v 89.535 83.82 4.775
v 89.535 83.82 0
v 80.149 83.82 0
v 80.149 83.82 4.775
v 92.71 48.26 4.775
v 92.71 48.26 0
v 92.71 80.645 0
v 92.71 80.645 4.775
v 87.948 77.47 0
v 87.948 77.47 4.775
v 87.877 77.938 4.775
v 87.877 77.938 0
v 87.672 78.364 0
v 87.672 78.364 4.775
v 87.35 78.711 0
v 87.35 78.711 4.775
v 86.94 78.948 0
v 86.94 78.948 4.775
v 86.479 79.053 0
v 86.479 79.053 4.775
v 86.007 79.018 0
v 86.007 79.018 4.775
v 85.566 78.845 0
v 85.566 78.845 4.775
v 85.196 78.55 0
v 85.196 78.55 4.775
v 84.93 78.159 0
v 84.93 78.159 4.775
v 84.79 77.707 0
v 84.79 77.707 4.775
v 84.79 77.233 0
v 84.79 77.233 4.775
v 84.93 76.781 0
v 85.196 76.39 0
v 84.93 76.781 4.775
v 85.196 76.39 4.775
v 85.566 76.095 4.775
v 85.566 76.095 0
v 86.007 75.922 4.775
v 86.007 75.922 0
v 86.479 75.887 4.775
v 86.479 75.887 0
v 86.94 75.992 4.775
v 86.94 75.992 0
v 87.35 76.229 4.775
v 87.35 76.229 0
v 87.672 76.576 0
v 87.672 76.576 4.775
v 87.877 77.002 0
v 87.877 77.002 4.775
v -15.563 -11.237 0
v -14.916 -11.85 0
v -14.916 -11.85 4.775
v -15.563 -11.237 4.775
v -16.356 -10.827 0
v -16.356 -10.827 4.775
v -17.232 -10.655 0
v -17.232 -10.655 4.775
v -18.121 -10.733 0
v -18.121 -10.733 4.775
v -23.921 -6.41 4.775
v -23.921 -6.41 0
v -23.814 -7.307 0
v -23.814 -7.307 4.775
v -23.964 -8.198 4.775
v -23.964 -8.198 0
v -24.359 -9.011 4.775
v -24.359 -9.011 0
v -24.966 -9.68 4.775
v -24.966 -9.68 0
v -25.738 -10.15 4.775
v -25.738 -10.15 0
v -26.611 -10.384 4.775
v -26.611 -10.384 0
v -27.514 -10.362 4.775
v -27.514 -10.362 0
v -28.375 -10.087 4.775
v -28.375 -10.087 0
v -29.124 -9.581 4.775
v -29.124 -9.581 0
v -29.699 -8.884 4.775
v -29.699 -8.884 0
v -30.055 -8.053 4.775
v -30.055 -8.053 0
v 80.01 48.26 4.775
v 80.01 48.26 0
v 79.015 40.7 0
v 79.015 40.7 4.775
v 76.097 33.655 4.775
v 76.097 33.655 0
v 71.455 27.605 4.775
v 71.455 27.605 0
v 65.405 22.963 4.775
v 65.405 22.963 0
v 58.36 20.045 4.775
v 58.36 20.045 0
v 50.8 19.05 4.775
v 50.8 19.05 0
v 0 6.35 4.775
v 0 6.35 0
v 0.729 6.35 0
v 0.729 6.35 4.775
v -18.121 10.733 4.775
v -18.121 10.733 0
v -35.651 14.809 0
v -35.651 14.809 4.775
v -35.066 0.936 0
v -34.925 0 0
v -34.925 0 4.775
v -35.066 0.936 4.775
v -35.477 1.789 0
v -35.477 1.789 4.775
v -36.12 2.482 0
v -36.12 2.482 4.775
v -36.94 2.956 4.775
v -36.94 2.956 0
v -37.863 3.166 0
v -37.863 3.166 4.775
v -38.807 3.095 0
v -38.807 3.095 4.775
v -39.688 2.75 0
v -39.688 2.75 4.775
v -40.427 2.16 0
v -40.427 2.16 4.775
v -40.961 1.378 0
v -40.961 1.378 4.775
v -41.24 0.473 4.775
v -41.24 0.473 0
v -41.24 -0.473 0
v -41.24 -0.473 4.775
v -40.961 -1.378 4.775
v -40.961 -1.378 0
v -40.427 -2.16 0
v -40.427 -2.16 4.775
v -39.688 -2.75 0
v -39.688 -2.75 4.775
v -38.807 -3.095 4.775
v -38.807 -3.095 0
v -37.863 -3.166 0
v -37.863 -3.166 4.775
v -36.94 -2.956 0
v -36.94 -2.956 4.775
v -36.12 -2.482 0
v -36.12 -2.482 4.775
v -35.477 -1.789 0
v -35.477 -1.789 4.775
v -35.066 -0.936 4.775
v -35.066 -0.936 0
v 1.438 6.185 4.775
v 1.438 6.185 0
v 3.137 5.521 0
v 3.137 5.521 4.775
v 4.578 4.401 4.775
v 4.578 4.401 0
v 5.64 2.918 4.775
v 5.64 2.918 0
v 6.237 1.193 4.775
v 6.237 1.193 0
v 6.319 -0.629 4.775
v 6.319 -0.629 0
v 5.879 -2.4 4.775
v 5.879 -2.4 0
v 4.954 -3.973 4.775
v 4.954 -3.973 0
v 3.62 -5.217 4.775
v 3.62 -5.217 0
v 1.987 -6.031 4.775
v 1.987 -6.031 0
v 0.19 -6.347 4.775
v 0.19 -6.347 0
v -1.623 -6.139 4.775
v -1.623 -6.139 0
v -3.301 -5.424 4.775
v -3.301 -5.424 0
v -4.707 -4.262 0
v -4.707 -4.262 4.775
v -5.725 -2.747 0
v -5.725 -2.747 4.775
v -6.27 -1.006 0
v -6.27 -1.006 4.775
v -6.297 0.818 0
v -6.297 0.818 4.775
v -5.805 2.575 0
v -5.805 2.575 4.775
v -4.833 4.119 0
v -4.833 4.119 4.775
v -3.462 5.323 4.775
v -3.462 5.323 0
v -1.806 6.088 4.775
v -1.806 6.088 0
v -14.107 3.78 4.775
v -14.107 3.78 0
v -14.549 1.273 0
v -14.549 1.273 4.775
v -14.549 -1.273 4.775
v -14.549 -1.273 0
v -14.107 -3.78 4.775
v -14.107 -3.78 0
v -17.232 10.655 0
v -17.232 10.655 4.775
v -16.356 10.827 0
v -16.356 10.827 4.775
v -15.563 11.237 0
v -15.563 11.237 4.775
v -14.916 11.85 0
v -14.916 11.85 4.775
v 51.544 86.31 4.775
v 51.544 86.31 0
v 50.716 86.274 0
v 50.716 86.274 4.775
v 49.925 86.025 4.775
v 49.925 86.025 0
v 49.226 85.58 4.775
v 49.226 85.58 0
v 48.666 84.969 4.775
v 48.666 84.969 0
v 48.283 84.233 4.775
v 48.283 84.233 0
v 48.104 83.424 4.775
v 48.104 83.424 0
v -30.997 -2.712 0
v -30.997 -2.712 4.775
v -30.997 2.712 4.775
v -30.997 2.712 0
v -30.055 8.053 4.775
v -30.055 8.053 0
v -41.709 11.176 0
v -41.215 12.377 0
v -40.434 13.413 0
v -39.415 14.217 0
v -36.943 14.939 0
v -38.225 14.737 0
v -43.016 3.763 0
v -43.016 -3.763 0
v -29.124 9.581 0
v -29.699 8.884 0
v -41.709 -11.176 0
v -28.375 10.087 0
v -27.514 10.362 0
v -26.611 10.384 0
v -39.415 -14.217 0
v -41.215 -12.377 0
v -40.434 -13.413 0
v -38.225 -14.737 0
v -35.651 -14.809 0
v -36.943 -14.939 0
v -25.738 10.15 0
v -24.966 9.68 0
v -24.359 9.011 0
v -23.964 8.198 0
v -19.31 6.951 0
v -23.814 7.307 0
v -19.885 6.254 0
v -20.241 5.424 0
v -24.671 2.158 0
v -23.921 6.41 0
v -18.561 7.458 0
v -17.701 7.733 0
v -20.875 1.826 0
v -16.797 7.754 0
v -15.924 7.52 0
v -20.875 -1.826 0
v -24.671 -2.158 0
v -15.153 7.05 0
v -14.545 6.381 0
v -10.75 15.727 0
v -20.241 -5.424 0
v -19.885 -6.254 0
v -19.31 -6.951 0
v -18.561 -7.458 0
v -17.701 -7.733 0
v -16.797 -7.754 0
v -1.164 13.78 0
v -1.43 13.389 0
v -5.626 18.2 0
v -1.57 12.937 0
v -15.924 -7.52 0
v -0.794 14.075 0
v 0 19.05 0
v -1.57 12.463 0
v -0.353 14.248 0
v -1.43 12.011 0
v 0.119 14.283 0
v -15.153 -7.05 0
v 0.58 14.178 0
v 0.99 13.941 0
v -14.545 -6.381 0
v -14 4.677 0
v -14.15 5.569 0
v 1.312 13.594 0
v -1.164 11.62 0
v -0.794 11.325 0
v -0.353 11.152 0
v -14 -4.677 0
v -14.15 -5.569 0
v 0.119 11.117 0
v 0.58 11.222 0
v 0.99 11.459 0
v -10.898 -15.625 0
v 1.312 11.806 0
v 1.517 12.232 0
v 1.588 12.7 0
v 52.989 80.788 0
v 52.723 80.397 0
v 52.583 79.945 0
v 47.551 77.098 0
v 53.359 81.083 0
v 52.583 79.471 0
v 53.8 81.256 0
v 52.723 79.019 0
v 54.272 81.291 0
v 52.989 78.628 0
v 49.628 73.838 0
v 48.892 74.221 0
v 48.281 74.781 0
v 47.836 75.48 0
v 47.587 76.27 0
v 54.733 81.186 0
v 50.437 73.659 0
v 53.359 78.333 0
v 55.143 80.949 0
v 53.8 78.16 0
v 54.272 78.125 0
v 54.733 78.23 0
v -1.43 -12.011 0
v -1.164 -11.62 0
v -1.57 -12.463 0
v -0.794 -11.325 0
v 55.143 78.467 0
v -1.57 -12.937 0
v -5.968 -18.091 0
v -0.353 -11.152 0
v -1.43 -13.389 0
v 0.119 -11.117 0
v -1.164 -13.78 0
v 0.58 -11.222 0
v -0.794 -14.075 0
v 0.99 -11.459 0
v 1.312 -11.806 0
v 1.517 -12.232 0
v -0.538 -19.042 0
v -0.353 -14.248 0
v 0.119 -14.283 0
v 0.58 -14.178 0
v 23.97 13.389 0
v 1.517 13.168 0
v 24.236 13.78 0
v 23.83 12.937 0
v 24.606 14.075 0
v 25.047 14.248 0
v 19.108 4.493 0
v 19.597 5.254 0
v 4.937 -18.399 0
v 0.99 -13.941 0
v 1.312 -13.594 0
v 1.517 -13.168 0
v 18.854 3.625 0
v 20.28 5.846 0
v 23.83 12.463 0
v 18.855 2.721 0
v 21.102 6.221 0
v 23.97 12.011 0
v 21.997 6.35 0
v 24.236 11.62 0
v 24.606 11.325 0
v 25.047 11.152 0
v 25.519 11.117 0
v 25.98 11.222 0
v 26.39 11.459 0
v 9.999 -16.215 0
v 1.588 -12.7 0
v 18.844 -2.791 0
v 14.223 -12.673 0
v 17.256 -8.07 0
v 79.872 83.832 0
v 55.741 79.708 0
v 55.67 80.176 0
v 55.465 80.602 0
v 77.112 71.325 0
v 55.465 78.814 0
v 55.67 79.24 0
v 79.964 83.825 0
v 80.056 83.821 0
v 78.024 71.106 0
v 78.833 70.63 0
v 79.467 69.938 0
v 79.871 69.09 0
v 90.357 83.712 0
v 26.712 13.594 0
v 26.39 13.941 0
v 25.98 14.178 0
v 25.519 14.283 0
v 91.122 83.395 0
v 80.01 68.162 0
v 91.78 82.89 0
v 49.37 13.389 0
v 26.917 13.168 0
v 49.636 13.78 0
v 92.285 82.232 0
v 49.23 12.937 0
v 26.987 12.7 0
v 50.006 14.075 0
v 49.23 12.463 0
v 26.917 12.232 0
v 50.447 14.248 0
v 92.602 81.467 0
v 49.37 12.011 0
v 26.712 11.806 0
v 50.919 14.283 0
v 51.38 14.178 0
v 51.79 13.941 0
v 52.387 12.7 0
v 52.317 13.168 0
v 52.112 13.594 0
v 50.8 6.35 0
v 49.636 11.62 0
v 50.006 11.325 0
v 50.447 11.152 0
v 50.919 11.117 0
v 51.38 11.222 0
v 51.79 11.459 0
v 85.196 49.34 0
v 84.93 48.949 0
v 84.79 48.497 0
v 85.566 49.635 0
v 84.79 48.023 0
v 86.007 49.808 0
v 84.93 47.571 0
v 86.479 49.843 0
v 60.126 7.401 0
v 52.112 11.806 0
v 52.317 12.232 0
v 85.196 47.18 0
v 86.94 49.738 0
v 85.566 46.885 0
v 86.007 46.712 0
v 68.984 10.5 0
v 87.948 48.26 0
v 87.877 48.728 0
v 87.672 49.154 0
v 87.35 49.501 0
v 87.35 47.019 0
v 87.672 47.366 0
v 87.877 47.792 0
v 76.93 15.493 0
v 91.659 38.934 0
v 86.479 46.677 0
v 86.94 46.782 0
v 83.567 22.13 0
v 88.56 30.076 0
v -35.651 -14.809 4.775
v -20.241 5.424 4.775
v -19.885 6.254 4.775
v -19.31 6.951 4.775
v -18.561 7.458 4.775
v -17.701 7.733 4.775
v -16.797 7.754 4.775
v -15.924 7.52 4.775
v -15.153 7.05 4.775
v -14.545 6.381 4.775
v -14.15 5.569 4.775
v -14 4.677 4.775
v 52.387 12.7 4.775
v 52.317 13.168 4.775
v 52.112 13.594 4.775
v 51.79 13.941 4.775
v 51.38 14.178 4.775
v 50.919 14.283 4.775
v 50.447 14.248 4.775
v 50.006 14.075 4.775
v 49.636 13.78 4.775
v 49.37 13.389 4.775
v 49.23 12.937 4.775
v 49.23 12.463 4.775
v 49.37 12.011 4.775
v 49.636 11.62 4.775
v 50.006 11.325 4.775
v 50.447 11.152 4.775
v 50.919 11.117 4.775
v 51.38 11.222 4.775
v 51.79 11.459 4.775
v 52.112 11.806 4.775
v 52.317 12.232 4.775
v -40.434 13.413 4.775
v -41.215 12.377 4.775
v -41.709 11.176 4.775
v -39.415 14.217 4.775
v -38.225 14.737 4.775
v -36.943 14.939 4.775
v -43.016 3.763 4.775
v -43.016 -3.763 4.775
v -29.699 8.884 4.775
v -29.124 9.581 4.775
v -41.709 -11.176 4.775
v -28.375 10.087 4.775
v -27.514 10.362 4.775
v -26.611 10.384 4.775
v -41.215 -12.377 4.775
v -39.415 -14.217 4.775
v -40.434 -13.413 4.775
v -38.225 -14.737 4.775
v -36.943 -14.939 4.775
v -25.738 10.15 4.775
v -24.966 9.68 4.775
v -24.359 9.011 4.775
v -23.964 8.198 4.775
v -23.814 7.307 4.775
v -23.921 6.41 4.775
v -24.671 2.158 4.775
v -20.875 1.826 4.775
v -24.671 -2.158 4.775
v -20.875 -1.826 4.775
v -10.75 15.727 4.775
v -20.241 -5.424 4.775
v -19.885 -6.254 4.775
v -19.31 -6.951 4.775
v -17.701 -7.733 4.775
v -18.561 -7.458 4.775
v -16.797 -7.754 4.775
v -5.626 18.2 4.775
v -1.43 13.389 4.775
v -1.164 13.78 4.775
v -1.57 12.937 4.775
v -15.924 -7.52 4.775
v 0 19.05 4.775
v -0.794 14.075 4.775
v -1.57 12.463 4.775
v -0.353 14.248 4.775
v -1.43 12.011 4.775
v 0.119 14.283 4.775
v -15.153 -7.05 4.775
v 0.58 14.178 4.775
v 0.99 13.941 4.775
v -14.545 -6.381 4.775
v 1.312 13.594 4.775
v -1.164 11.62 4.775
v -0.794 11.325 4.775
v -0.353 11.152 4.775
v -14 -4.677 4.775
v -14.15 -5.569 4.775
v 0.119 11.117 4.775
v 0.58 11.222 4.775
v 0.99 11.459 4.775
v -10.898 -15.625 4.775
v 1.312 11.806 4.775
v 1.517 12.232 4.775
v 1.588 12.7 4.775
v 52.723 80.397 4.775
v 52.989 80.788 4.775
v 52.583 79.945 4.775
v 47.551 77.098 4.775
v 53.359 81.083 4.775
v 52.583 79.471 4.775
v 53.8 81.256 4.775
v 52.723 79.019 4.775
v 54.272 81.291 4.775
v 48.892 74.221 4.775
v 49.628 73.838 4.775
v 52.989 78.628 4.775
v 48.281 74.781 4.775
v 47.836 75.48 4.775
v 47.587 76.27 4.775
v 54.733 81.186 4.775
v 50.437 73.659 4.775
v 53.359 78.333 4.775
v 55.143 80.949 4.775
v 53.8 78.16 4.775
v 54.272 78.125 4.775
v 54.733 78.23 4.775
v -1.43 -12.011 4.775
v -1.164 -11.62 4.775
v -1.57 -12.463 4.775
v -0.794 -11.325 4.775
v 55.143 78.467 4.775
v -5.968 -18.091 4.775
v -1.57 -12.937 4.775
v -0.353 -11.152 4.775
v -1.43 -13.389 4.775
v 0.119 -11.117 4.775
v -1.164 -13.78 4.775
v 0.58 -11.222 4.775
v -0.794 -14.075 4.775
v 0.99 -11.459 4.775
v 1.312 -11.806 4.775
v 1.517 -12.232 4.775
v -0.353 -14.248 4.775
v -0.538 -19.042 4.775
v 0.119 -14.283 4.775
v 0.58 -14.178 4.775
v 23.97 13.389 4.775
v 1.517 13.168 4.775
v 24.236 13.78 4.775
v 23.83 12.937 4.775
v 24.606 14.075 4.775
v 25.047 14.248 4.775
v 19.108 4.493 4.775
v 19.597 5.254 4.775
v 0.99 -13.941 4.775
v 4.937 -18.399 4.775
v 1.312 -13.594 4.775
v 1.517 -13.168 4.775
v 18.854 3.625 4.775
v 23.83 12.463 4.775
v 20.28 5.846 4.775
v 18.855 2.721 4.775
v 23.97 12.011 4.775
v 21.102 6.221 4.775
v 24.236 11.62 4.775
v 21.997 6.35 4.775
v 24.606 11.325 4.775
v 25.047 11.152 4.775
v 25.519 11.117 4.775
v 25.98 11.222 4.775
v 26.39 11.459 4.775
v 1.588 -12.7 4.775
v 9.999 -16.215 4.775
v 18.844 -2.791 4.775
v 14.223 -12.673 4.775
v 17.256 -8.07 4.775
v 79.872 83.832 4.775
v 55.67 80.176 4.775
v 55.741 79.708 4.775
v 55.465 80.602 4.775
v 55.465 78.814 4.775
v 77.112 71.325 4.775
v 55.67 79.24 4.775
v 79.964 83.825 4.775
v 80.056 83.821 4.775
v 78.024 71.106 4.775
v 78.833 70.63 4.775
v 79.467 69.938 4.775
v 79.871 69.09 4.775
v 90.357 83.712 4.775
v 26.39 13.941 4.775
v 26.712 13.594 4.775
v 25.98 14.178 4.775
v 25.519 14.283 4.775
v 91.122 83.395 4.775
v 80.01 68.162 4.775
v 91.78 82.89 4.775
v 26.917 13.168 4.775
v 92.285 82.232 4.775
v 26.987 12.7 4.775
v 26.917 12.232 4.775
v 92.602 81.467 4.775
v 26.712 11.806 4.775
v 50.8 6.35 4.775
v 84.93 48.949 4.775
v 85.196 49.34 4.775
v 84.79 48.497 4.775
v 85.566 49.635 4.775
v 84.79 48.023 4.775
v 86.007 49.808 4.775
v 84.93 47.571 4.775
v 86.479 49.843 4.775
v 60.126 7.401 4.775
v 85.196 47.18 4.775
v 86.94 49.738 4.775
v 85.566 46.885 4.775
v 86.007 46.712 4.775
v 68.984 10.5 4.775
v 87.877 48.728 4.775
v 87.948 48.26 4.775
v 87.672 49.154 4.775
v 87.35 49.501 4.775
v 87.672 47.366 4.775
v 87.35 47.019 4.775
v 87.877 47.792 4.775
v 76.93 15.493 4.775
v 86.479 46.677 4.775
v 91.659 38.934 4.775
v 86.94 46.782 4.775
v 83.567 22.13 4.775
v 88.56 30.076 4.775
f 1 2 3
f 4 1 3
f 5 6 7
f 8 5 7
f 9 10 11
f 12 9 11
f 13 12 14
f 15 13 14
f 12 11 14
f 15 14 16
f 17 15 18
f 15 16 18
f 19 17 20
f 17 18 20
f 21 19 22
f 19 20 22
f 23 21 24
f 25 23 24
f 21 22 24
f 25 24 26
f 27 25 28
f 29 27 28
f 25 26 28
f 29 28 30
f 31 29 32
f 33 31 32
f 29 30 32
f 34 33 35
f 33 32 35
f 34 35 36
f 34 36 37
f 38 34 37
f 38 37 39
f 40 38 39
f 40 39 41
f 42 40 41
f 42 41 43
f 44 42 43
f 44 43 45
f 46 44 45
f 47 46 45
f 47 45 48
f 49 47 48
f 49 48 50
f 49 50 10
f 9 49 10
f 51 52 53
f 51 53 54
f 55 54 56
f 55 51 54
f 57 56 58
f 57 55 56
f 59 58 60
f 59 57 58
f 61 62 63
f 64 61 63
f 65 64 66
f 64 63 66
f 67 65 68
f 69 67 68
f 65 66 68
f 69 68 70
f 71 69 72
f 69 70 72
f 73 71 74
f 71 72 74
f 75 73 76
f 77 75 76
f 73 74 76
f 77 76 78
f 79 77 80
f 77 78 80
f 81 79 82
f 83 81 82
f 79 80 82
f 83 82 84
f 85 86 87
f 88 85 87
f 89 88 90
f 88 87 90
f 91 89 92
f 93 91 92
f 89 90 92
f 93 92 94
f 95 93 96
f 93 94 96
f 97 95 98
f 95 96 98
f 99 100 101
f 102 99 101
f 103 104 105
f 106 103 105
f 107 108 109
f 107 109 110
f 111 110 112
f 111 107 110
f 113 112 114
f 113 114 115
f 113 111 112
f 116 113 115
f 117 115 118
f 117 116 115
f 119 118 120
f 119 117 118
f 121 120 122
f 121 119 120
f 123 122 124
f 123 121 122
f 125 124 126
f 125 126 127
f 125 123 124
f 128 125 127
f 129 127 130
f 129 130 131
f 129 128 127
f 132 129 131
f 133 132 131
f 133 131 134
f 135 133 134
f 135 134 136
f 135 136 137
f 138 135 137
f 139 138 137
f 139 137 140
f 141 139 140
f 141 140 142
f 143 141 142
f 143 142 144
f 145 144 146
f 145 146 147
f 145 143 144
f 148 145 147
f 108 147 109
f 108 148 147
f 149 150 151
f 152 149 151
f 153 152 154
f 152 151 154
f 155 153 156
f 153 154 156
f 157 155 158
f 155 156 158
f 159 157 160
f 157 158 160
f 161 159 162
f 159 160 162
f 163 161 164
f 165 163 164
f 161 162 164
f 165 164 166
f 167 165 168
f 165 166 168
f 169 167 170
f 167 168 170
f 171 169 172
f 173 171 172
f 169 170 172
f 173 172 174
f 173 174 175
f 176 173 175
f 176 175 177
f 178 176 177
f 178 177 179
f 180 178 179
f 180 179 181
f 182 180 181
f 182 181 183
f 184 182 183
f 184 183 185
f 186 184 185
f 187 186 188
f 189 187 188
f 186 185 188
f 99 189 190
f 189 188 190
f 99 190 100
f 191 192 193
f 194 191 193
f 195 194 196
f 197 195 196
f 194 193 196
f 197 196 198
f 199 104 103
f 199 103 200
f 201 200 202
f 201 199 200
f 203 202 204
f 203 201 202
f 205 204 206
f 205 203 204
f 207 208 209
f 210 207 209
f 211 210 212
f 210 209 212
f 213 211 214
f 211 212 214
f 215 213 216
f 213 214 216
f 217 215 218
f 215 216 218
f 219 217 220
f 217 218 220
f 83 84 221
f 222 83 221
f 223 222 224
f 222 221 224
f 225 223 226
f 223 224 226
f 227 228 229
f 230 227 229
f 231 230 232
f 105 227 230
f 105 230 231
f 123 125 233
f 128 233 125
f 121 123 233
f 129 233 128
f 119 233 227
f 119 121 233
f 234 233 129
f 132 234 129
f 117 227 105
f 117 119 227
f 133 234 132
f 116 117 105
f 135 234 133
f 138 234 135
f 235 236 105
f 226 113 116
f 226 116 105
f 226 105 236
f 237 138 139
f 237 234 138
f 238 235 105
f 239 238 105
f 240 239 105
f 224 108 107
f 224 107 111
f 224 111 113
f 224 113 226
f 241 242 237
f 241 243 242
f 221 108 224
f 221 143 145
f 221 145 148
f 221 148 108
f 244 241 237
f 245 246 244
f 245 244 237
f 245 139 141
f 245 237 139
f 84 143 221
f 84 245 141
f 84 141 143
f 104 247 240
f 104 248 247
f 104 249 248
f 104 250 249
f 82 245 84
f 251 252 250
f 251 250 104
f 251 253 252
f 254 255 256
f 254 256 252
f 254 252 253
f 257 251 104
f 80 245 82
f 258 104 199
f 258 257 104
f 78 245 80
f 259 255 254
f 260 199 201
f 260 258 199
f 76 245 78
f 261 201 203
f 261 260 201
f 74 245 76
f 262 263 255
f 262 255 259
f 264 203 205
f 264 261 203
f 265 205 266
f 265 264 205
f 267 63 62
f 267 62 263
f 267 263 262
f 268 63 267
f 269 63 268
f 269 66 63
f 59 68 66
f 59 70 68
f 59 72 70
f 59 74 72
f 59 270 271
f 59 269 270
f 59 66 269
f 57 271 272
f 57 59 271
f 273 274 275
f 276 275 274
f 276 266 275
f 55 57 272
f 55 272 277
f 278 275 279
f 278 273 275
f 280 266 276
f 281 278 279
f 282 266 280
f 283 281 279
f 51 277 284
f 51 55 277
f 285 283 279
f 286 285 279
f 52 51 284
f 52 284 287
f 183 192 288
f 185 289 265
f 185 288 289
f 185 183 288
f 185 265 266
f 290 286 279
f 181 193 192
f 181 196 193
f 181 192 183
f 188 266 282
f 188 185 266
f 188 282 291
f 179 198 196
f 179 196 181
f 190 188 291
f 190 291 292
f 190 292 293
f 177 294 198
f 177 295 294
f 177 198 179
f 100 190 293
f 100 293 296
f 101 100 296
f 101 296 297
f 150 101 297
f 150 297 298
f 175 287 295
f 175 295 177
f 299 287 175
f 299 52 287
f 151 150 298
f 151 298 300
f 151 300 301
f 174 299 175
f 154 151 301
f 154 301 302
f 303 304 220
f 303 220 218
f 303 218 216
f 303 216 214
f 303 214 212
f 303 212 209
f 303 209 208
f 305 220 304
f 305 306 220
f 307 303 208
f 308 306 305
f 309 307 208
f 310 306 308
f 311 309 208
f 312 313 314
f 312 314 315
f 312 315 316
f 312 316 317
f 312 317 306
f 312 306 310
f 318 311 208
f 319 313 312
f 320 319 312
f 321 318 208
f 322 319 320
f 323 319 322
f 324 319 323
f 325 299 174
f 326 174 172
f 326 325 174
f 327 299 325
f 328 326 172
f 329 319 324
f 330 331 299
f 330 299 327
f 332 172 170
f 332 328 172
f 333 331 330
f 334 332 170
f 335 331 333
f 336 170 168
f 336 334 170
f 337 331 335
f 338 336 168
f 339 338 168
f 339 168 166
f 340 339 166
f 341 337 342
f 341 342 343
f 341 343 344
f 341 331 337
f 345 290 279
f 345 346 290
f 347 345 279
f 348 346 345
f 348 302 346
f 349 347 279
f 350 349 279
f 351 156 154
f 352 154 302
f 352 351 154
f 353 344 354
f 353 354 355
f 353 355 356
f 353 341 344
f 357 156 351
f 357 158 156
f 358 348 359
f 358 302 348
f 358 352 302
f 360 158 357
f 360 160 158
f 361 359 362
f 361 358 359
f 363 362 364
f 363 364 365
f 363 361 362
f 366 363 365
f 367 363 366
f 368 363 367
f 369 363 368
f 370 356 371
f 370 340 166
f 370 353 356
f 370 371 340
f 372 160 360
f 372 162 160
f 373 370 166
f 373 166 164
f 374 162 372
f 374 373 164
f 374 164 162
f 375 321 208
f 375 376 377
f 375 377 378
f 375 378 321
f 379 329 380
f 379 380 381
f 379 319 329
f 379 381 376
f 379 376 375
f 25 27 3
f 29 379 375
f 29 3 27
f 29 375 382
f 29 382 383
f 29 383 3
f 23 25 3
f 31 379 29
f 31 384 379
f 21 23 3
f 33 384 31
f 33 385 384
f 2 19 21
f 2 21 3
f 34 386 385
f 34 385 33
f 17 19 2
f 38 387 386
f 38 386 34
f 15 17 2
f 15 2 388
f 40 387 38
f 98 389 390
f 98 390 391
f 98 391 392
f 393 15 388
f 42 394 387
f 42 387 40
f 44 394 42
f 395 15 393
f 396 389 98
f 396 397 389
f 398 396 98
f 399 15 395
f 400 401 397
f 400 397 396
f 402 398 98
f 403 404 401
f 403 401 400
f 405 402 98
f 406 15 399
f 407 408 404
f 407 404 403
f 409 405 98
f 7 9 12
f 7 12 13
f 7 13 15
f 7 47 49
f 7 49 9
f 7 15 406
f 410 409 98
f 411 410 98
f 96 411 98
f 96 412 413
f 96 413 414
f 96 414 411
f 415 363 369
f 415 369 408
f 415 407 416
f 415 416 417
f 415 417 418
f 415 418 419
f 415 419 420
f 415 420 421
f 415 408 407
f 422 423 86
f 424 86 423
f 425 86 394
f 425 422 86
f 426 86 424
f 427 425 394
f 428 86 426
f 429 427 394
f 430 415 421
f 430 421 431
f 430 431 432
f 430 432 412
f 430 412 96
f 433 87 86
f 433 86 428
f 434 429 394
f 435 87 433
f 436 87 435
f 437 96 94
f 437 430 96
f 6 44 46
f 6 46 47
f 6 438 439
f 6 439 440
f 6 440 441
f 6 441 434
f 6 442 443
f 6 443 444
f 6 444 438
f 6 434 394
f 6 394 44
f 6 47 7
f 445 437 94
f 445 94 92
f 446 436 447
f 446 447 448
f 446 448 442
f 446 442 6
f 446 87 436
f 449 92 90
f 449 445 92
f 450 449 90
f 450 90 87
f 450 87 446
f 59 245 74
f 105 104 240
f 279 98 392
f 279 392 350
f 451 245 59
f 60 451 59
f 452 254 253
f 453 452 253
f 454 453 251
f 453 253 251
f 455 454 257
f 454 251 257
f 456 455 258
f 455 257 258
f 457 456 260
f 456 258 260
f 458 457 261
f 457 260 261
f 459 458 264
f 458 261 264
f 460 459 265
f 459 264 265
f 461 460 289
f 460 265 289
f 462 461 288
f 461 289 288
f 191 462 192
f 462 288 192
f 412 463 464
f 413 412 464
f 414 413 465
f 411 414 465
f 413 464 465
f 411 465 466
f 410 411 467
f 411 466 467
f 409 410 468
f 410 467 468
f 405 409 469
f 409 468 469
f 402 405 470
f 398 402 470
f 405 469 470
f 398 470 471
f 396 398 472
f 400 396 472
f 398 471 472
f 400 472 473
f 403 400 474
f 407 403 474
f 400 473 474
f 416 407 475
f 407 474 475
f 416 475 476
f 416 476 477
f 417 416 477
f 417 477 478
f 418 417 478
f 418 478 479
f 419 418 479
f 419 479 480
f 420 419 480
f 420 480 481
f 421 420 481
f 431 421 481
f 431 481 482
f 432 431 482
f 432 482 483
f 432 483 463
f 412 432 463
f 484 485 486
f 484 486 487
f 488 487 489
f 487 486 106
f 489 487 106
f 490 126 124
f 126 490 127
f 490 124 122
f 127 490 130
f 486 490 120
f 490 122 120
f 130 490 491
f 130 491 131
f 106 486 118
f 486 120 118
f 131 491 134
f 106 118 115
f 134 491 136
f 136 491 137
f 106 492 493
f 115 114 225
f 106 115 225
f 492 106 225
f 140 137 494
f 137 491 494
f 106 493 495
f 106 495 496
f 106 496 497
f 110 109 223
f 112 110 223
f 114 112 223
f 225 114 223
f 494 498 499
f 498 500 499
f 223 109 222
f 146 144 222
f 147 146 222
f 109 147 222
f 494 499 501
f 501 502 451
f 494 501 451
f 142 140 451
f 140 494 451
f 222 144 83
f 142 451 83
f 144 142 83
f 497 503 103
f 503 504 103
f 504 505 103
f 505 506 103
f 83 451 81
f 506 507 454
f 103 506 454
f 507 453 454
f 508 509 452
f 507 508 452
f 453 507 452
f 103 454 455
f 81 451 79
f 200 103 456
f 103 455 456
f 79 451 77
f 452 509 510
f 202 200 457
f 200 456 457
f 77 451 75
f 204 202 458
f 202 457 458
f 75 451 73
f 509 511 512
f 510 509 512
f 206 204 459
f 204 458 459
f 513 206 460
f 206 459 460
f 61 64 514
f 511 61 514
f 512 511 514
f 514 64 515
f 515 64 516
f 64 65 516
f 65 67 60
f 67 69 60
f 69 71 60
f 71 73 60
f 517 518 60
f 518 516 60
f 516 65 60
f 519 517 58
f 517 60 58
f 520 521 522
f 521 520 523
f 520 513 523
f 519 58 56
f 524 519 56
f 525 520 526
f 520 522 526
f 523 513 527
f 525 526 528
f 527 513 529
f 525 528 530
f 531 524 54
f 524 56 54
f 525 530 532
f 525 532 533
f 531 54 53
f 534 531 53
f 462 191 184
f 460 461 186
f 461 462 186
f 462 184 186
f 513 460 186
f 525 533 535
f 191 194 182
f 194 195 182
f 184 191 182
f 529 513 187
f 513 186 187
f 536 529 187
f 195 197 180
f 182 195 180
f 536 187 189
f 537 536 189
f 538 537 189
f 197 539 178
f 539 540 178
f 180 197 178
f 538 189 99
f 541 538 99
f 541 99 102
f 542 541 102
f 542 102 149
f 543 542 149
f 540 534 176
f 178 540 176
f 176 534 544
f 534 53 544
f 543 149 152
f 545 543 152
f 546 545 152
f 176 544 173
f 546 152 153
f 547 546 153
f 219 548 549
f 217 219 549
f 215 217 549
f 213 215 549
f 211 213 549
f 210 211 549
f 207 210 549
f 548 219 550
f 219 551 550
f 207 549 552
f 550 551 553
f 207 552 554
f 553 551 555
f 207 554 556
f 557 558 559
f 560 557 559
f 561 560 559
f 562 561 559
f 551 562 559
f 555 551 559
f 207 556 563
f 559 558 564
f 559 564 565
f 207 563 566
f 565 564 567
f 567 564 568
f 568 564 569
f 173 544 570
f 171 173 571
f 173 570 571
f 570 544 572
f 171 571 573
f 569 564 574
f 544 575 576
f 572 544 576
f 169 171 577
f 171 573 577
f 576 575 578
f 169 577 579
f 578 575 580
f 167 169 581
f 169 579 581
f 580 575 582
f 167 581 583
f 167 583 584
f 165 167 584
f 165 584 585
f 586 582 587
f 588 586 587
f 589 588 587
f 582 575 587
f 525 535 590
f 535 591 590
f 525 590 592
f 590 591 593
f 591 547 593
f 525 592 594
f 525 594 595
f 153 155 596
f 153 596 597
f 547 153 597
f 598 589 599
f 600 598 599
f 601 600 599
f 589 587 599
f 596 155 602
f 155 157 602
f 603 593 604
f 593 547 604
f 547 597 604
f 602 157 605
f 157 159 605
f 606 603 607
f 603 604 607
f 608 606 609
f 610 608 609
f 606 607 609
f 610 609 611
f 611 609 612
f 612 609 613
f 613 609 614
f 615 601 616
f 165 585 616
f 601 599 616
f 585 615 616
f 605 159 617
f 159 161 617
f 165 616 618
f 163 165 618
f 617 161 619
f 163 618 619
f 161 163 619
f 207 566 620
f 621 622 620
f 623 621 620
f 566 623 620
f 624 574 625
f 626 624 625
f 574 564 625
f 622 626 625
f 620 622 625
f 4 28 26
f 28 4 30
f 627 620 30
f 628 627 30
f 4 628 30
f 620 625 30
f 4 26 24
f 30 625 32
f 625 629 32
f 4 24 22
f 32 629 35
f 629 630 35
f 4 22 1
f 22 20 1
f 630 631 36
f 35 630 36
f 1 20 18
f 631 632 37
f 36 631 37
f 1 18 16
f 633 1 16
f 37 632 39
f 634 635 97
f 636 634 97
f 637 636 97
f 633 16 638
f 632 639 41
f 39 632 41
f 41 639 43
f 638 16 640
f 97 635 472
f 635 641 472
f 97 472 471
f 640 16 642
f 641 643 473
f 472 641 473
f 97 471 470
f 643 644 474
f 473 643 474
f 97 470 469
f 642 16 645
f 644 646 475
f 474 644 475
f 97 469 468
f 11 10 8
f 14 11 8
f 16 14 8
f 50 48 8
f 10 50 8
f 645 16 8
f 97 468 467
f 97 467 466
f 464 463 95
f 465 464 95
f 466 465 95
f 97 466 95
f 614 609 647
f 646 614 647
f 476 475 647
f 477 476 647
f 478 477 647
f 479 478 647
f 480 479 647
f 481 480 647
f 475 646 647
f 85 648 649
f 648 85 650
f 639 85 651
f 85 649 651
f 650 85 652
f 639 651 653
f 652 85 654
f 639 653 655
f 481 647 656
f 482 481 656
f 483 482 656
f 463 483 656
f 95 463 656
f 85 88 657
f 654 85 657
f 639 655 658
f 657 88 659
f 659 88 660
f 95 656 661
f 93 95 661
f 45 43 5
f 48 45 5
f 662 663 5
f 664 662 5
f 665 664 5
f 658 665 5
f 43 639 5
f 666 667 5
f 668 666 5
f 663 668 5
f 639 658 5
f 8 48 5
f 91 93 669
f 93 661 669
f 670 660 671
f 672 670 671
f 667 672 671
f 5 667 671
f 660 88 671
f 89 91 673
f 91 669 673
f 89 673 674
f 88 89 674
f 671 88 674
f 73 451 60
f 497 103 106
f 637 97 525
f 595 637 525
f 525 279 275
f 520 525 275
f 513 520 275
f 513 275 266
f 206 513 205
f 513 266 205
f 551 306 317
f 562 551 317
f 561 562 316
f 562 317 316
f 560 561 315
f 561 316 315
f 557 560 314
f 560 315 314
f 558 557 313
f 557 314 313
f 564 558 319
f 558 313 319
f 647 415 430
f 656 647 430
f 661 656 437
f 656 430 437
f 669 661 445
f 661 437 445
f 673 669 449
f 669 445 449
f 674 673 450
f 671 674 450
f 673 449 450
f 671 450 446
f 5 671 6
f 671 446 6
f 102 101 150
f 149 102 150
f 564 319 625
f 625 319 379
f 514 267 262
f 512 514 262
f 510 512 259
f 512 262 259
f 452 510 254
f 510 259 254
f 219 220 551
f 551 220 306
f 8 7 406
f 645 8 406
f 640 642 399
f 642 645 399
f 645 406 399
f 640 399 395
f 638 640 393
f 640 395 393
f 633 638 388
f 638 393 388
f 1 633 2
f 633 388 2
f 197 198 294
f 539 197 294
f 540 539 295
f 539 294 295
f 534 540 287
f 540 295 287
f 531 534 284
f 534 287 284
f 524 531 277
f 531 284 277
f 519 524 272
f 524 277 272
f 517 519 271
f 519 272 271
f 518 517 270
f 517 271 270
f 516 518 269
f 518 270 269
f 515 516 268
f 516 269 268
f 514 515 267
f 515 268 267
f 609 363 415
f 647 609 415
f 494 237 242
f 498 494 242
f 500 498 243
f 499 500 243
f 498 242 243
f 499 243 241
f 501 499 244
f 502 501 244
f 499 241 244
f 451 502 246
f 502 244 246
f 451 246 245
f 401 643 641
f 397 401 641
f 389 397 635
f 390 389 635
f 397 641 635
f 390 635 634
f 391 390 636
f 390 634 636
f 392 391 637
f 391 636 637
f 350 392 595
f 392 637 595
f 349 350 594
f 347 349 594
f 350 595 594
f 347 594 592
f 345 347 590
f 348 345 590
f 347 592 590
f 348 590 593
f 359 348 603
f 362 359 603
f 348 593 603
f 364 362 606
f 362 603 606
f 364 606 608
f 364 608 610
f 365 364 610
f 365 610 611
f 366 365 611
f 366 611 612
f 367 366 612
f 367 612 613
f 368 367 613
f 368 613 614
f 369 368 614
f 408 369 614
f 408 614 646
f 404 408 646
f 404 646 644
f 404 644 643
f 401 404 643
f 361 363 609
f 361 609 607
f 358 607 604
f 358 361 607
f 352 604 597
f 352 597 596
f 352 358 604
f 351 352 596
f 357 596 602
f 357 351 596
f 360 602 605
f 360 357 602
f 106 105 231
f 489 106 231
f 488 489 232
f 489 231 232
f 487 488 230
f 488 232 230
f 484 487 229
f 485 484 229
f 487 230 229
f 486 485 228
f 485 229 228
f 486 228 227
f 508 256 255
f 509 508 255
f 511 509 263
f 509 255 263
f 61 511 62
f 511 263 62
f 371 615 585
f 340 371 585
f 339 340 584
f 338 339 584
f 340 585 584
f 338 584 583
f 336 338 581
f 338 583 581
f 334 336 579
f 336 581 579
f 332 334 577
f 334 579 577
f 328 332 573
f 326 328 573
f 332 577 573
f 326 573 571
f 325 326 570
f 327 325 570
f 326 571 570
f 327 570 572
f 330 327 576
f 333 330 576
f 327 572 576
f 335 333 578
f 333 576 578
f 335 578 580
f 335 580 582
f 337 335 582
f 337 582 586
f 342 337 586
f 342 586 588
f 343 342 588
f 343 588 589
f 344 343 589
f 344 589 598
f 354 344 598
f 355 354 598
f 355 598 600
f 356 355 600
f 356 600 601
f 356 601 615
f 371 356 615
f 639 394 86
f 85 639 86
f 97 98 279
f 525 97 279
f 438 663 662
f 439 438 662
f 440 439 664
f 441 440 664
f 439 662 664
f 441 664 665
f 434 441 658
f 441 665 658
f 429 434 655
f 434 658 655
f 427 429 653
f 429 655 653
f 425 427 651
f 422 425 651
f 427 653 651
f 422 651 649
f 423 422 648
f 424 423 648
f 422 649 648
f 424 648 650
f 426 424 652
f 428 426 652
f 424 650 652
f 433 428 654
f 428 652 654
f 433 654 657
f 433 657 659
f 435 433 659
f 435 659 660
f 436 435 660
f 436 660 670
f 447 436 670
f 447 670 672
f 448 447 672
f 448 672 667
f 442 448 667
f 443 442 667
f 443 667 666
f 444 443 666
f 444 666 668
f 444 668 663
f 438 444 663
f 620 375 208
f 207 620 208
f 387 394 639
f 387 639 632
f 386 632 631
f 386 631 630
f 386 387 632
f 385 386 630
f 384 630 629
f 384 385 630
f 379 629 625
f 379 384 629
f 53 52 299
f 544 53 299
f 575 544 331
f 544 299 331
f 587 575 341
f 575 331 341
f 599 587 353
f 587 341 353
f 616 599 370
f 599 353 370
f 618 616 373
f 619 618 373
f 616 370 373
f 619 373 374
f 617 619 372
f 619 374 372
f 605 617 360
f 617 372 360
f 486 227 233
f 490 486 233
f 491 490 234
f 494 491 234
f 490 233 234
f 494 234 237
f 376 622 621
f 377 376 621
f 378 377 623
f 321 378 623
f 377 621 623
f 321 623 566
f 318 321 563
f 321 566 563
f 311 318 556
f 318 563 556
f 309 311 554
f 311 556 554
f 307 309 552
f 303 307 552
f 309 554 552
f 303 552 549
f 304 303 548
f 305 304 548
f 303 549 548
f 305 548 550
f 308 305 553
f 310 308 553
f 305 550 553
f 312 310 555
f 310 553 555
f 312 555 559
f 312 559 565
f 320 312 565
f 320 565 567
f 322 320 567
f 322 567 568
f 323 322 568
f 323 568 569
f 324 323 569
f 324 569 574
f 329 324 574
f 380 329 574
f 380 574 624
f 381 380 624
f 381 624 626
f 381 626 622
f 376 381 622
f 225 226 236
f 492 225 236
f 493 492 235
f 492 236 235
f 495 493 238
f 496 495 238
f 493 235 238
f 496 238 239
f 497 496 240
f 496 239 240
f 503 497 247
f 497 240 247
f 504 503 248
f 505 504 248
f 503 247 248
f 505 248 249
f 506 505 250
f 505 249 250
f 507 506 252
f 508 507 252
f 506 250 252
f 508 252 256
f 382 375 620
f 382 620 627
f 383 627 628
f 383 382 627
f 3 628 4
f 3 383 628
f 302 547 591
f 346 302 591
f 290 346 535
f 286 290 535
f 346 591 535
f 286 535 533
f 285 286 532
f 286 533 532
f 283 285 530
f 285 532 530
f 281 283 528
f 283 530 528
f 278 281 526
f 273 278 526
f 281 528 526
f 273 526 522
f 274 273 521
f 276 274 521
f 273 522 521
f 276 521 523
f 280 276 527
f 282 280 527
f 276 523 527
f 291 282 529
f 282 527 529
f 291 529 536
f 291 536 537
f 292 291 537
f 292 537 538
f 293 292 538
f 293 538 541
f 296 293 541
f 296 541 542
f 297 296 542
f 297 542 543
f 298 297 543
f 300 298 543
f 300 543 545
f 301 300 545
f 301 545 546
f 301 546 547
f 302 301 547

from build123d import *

# Parameters (mm, degrees)
SKETCH1_R           = 3.175
BOSS_EXTRUDE1_DEPTH = 4.7752
FILLET1_R           = 3.175
SKETCH2_R           = 1.5875
CUT_EXTRUDE2_DEPTH  = 12.6492


with BuildPart() as part:
    # Sketch1 → Boss-Extrude1 (new body)
    with BuildSketch(Plane.XY):
        with BuildLine():
            ThreePointArc((-41.708677179, -11.175806368), (-39.414754754, -14.217464212), (-35.65126732, -14.809008693))
            Line((-35.65126732, -14.809008693), (-16.055699309, -10.252659153))
            ThreePointArc((-16.055699309, -10.252659153), (8.35578547, -17.119677251), (17.960512242, 6.35))
            Line((17.960512242, 6.35), (50.8, 6.35))
            ThreePointArc((50.8, 6.35), (80.4348452, 18.6251548), (92.71, 48.26))
            Line((92.71, 48.26), (92.71, 83.82))
            Line((92.71, 83.82), (80.01, 83.82))
            Line((80.01, 83.82), (48.380818336, 86.587194832))
            Line((48.380818336, 86.587194832), (47.273940403, 73.935522166))
            Line((47.273940403, 73.935522166), (80.01, 71.071488063))
            Line((80.01, 71.071488063), (80.01, 48.26))
            ThreePointArc((80.01, 48.26), (71.454589078, 27.605410922), (50.8, 19.05))
            Line((50.8, 19.05), (0, 19.05))
            ThreePointArc((0, 19.05), (-9.153942952, 16.706520536), (-16.055699309, 10.252659153))
            Line((-16.055699309, 10.252659153), (-35.65126732, 14.809008693))
            ThreePointArc((-35.65126732, 14.809008693), (-39.414754754, 14.217464212), (-41.708677179, 11.175806368))
            ThreePointArc((-41.708677179, 11.175806368), (-43.18, 0), (-41.708677179, -11.175806368))
        make_face()
        with BuildLine():
            ThreePointArc((-23.921153088, -6.409653652), (-26.166217118, -10.298218619), (-30.054782085, -8.053154588))
            ThreePointArc((-30.054782085, -8.053154588), (-31.115, 0), (-30.054782085, 8.053154588))
            ThreePointArc((-30.054782085, 8.053154588), (-26.166217118, 10.298218619), (-23.921153088, 6.409653652))
            ThreePointArc((-23.921153088, 6.409653652), (-24.765, 0), (-23.921153088, -6.409653652))
        make_face(mode=Mode.SUBTRACT)
        with BuildLine():
            ThreePointArc((-20.24097569, -5.42355309), (-20.955, 0), (-20.24097569, 5.42355309))
            ThreePointArc((-20.24097569, 5.42355309), (-16.352410723, 7.66861712), (-14.107346693, 3.780052154))
            ThreePointArc((-14.107346693, 3.780052154), (-14.605, 0), (-14.107346693, -3.780052154))
            ThreePointArc((-14.107346693, -3.780052154), (-16.352410723, -7.66861712), (-20.24097569, -5.42355309))
        make_face(mode=Mode.SUBTRACT)
        with Locations((-38.1, 0)):
            Circle(SKETCH1_R, mode=Mode.SUBTRACT)
        with BuildLine():
            ThreePointArc((1.438133327, 6.185003843), (-0.723783669, -6.308616108), (0, 6.35))
            Line((0, 6.35), (0.728531617, 6.35))
            Line((0.728531617, 6.35), (1.438133327, 6.185003843))
        make_face(mode=Mode.SUBTRACT)
    extrude(amount=BOSS_EXTRUDE1_DEPTH)

    # Fillet1
    # the kernel refuses this fillet: 3.175 mm, written as the material it adds along each edge
    with BuildSketch(Plane(origin=(-16.055699309, 10.252659153, 0), x_dir=(0.5808999309278821, 0.8139749813403246, 0), z_dir=(0, 0, 1))) as fillet1_piece_1:
        with BuildLine():
            CenterArc((2.126250916, 3.170784423), FILLET1_R, 202.42407708, 64.623066475)
            Line((-0.808674052, 1.959652545), (0, 0))
            ThreePointArc((0, 0), (0.981346577, 0.025293461), (1.962693154, 0))
        make_face()
    extrude(amount=4.7752)
    with BuildSketch(Plane(origin=(80.01, 71.071488063, 0), x_dir=(-0.9961946980917454, 0.08715574274765892, 0), z_dir=(0, 0, 1))) as fillet1_piece_2:
        with BuildLine():
            CenterArc((FILLET1_R * 0.916331174017, FILLET1_R), FILLET1_R, 185, 85)
            Line((-FILLET1_R * 0.0798635240743, FILLET1_R * 0.912844257252), (0, 0))
            Line((0, 0), (FILLET1_R * 0.916331174017, 0))
        make_face()
    extrude(amount=4.7752)
    with BuildSketch(Plane(origin=(80.01, 83.82, 0), x_dir=(1, 0, 0), z_dir=(0, 0, 1))) as fillet1_piece_3:
        with BuildLine():
            CenterArc((FILLET1_R * 0.0436609429085, FILLET1_R), FILLET1_R, 265, 5)
            Line((-FILLET1_R * 0.0434947998391, FILLET1_R * 0.00380530190826), (0, 0))
            Line((0, 0), (FILLET1_R * 0.0436609429085, 0))
        make_face()
    extrude(amount=4.7752)
    with BuildSketch(Plane(origin=(17.960512242, 6.35, 0), x_dir=(0.23924892683917381, -0.9709582642968253, 0), z_dir=(0, 0, 1))) as fillet1_piece_4:
        with BuildLine():
            CenterArc((4.048528681, 3.159689746), FILLET1_R, 166.157784332, 98.213210702)
            Line((0.965736192, 3.919305089), (0, 0))
            ThreePointArc((0, 0), (1.868551699, 0.091861522), (3.737103398, 0))
        make_face()
    extrude(amount=4.7752)
    with BuildSketch(Plane(origin=(-16.055699309, -10.252659153, 0), x_dir=(-0.9740163531879217, -0.22647768923781808, 0), z_dir=(0, 0, 1))) as fillet1_piece_5:
        with BuildLine():
            CenterArc((2.1199509, 3.175), FILLET1_R, 205.376933525, 64.623066475)
            ThreePointArc((-0.748686692, 1.814285714), (-0.350962429, 0.916791272), (0, 0))
            Line((0, 0), (2.1199509, 0))
        make_face()
    extrude(amount=4.7752)
    # the kernel refuses this fillet: 3.175 mm, written as the material it takes off along each edge
    with BuildSketch(Plane(origin=(47.273940403, 73.935522166, -7.9375), x_dir=(0.0871557427476583, 0.9961946980917454, 0), z_dir=(0, 0, 1)), Plane(origin=(48.380818336, 86.587194832, -7.9375), x_dir=(0.9961946980917455, -0.08715574274765811, 0), z_dir=(0, 0, 1)), Plane(origin=(92.71, 83.82, -7.9375), x_dir=(0, -1, 0), z_dir=(0, 0, 1))) as fillet1_2_piece_1:
        with BuildLine():
            CenterArc((FILLET1_R, -FILLET1_R), FILLET1_R, 90, 90)
            Line((0, -FILLET1_R), (0, 0))
            Line((0, 0), (FILLET1_R, 0))
        make_face()
    extrude(amount=20.6502, mode=Mode.SUBTRACT)

    # Sketch2 → Cut-Extrude2 (cut)
    with BuildSketch(Plane.XY.offset(4.7752)):
        with Locations((0, 12.7)):
            Circle(SKETCH2_R)
        with Locations((0, -12.7)):
            Circle(SKETCH2_R)
        with Locations((25.4, 12.7)):
            Circle(SKETCH2_R)
        with Locations((54.153215702, 79.707919533)):
            Circle(SKETCH2_R)
        with Locations((50.8, 12.7)):
            Circle(SKETCH2_R)
        with Locations((86.36, 77.47)):
            Circle(SKETCH2_R)
        with Locations((86.36, 48.26)):
            Circle(SKETCH2_R)
    extrude(amount=-CUT_EXTRUDE2_DEPTH, mode=Mode.SUBTRACT)


solid = part.part
